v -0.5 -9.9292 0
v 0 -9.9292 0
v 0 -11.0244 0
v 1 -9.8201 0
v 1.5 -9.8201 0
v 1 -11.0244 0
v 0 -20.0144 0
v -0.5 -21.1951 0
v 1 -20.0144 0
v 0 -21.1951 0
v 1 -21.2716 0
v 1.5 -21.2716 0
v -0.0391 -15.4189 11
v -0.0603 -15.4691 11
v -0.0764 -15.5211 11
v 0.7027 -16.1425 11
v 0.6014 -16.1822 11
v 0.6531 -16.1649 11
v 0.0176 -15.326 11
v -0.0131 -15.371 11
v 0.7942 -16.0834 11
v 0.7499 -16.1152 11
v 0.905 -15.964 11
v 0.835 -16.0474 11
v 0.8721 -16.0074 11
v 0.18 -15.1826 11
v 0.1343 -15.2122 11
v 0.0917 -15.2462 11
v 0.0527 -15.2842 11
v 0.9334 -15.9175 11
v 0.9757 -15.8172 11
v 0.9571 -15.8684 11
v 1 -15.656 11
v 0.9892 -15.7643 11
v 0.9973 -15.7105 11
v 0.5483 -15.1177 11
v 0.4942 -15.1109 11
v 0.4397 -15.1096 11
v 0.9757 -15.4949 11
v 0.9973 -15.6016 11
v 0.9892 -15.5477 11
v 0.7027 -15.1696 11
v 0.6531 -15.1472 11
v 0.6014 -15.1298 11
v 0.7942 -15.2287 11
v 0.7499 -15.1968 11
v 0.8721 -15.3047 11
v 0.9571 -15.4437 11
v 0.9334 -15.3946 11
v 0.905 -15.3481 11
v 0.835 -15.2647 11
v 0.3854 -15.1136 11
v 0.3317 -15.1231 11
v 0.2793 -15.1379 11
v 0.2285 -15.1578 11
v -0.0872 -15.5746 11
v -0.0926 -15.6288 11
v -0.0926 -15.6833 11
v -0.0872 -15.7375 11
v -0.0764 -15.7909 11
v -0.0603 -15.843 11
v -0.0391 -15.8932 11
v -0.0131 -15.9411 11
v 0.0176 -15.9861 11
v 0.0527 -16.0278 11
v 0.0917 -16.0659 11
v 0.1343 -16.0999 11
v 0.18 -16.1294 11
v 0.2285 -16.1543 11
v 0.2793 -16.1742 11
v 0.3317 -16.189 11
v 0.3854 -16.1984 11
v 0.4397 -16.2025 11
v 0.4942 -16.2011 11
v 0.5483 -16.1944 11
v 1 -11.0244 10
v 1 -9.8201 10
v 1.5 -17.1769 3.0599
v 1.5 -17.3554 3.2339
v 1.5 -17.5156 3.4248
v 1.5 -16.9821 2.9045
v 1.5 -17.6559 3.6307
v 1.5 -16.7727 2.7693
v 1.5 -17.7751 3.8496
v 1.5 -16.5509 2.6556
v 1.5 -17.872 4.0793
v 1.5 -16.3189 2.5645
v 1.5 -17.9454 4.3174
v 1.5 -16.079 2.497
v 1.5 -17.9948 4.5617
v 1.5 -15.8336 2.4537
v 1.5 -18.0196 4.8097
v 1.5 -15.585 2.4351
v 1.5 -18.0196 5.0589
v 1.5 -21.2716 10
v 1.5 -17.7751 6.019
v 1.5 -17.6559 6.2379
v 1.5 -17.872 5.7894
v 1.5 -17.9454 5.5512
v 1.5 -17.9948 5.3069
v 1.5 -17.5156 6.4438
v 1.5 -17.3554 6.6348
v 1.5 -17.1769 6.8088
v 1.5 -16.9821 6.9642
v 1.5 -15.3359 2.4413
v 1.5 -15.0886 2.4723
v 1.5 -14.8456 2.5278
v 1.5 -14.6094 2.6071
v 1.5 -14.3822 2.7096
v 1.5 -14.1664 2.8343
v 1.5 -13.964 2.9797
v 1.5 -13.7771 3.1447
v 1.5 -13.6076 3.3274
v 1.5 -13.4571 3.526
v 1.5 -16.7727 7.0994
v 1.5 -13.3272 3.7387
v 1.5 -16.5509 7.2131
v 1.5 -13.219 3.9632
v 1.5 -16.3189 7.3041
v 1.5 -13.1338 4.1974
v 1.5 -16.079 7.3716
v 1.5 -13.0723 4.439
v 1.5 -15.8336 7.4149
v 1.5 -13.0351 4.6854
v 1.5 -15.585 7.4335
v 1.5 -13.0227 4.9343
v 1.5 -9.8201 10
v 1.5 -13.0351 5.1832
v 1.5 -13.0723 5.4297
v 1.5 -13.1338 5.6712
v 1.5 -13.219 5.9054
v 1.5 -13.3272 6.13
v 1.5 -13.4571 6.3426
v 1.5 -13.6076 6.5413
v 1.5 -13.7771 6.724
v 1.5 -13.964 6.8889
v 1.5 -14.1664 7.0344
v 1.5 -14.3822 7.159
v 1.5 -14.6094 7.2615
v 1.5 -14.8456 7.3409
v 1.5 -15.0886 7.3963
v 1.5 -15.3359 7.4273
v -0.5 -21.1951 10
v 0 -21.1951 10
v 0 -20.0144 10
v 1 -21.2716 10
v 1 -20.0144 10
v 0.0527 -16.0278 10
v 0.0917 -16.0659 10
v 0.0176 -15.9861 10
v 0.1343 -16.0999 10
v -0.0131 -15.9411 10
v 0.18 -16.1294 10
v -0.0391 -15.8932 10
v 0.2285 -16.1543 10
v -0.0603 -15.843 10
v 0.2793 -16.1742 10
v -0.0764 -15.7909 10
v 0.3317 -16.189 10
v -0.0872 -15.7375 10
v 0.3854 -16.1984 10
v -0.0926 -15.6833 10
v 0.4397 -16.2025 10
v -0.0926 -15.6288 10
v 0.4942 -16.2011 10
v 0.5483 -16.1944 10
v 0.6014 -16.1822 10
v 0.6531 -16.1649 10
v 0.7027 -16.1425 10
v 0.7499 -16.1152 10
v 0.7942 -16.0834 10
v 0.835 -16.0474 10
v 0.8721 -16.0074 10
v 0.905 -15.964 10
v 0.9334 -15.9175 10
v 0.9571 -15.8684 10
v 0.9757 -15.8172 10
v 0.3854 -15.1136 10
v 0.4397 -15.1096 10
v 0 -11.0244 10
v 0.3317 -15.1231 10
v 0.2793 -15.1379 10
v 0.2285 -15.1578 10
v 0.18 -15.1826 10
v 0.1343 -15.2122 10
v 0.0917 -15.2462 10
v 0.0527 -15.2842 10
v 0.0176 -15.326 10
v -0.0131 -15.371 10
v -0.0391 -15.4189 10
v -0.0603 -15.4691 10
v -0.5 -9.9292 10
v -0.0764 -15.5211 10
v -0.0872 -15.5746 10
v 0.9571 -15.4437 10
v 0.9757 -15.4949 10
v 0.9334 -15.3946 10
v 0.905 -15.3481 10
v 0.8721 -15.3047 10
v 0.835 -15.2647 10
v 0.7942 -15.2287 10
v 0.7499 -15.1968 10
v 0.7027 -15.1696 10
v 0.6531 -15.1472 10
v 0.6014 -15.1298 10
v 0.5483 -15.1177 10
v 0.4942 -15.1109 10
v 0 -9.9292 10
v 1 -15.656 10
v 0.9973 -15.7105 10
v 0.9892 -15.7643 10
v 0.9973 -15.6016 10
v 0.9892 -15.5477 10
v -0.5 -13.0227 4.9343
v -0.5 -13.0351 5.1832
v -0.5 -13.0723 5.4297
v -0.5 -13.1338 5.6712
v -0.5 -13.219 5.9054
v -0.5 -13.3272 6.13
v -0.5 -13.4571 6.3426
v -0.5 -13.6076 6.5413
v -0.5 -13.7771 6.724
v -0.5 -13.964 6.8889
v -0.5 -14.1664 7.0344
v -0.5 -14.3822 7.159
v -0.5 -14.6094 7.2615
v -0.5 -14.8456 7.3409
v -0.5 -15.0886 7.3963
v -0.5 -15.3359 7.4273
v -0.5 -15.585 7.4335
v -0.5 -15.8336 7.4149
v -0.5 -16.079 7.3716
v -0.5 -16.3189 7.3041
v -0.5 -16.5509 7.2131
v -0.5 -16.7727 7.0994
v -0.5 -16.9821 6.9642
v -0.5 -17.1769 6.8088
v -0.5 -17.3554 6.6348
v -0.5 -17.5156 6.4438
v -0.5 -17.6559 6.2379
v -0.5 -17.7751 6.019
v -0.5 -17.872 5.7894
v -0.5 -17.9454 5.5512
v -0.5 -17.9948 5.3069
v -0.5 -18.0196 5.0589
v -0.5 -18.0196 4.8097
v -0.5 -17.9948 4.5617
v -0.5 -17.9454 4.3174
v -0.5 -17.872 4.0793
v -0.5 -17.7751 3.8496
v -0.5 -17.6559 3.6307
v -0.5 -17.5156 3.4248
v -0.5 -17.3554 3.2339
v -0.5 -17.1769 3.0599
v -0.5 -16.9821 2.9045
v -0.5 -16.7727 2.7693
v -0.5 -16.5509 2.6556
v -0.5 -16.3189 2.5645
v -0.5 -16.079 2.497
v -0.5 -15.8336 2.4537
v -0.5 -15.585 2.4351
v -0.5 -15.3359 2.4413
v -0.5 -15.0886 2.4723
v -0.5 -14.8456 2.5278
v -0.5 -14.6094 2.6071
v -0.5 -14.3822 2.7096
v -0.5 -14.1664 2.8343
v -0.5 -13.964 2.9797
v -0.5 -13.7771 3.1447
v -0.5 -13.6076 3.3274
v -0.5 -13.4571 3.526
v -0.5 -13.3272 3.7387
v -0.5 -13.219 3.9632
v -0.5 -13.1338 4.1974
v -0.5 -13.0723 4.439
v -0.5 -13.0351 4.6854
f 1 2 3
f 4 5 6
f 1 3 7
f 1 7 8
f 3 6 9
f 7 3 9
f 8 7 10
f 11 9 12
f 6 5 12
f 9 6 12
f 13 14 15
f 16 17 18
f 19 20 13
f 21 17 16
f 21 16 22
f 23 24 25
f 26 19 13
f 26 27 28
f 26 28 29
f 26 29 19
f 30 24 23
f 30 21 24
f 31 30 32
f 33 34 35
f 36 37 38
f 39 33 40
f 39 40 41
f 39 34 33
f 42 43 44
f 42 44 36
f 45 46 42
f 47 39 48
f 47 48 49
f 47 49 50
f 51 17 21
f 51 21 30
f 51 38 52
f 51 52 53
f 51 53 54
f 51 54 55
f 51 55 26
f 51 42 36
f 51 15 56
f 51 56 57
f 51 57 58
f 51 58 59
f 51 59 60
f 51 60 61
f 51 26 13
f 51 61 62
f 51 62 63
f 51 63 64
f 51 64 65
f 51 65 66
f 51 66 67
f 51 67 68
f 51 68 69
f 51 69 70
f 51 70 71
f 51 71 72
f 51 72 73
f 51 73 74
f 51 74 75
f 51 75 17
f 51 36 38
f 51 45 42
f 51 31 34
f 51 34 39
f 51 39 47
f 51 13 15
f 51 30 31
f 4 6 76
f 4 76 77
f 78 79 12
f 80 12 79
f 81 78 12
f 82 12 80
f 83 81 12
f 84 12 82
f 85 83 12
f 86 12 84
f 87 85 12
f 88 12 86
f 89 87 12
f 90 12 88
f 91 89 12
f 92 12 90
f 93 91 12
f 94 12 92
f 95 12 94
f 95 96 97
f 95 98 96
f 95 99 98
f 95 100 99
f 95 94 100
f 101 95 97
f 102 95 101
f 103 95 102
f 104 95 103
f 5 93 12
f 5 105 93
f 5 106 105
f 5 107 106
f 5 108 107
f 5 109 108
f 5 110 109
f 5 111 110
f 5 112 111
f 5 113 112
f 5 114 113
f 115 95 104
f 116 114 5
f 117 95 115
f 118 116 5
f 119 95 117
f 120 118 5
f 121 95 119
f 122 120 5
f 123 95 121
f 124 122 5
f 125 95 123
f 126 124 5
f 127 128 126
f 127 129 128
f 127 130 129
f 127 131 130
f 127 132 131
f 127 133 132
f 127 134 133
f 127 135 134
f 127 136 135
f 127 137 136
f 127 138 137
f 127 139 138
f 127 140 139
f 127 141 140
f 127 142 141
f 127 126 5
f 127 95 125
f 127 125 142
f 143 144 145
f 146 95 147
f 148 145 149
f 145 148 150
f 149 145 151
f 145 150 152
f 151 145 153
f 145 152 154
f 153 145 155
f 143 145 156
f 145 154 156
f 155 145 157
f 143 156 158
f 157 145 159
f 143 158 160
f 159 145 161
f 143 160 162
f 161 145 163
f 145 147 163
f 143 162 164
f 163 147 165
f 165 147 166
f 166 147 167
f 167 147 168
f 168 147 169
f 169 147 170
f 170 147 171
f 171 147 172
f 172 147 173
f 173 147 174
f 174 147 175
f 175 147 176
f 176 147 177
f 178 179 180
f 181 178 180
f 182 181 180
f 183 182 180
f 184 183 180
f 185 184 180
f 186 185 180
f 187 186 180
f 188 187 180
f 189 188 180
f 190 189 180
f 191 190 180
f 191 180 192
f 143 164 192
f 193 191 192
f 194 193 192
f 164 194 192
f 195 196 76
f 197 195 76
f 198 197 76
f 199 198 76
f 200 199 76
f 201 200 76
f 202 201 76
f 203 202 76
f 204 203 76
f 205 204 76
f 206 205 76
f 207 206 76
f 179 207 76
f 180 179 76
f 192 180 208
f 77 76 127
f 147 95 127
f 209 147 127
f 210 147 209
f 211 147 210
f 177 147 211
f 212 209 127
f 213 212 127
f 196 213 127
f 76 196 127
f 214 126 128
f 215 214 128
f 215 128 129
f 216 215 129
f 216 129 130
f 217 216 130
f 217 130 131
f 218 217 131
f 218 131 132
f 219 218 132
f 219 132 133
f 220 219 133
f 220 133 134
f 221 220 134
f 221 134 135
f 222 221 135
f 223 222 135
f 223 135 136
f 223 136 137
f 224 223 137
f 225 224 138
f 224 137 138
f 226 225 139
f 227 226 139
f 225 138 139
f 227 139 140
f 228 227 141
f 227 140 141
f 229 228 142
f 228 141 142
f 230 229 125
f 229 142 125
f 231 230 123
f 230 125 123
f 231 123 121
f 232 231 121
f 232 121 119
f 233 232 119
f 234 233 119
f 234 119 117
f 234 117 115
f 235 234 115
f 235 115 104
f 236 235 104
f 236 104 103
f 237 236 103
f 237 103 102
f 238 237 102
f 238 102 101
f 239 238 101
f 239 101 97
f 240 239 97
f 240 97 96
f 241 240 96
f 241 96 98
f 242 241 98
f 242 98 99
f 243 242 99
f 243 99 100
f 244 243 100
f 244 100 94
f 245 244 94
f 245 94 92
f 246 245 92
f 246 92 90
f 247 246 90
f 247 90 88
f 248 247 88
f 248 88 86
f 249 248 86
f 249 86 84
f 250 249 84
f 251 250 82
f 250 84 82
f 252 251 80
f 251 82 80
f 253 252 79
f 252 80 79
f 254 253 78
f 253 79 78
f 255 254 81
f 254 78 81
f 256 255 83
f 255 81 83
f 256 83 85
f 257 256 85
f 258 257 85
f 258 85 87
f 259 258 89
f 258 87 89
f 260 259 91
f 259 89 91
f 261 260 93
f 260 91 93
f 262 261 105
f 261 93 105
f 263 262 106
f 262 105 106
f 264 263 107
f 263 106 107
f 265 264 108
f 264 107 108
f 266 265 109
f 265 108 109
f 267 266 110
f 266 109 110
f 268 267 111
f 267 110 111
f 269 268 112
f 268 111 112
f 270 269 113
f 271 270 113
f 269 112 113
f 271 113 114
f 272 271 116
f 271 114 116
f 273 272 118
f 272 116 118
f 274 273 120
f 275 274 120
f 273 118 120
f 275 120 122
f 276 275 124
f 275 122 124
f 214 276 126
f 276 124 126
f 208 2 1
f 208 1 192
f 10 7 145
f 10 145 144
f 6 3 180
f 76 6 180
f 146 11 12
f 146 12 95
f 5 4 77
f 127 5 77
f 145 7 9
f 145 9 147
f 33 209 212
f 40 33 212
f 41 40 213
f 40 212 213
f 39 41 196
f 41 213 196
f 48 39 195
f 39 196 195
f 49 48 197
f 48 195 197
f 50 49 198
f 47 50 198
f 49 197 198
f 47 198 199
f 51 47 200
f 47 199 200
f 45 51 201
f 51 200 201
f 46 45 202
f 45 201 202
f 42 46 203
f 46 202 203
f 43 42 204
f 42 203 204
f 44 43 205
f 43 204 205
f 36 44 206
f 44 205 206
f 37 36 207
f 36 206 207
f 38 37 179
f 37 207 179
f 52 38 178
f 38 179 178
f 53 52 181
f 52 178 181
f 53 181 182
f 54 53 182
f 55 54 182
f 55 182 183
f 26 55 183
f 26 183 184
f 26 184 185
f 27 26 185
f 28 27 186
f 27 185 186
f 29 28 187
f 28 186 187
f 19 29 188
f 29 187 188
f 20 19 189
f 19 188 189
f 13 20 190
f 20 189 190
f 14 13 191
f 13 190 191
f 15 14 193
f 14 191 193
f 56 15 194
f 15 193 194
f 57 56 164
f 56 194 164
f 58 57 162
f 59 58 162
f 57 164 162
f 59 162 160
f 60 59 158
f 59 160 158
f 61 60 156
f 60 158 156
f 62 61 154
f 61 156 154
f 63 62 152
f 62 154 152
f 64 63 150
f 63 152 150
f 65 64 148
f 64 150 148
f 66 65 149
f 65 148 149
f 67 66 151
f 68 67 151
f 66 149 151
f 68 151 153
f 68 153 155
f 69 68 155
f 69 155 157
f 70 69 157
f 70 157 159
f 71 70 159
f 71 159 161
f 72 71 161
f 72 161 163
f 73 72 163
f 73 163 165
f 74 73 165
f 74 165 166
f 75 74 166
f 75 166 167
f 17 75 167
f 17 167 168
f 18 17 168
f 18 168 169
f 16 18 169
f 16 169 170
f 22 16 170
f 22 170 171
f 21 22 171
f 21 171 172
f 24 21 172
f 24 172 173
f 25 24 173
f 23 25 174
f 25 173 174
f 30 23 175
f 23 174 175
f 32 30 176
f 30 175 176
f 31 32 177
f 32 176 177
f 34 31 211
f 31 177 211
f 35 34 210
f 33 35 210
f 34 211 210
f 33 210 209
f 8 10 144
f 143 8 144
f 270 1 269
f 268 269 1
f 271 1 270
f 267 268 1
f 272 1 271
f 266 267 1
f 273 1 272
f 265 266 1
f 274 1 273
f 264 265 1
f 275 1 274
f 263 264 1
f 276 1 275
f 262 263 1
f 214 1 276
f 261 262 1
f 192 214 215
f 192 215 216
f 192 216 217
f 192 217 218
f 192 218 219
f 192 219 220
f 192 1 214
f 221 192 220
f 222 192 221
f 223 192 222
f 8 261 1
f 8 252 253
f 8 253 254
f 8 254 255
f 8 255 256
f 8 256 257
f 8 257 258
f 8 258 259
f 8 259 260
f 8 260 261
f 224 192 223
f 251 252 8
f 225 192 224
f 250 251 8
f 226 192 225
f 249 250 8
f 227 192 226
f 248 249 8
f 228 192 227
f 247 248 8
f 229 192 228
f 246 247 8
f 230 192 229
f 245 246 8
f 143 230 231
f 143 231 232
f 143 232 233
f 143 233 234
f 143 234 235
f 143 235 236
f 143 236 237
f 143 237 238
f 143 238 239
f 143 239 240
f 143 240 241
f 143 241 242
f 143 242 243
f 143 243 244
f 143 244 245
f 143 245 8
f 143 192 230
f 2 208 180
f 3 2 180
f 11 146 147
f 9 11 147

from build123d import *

# Parameters (mm, degrees)
F0_W     = 8.99
F0_H     = 10
F1_DEPTH = 1
F2_W     = 1.2572725254
F2_H     = 10
F2_W_2   = 1.20427544
F2_W_3   = 8.99
F3_DEPTH = 0.5
F4_W     = 1.095204528
F4_H     = 10
F4_W_2   = 8.99
F4_W_3   = 1.1806842821
F5_DEPTH = 0.5
F7_D     = 5
F8_R     = 0.546635634
F9_DEPTH = 1


with BuildPart() as f1:
    # F0 (on Right) → F1 (new body)
    with BuildSketch(Plane.YZ):
        with Locations((-15.5193753601, 5)):
            Rectangle(F0_W, F0_H)
    extrude(amount=F1_DEPTH)

    # F2 (on face) → F3 (join)
    with BuildSketch(Plane.YZ.offset(1)):
        with Locations((-20.6430116228, 5)):
            Rectangle(F2_W, F2_H)
        with Locations((-10.4222376401, 5)):
            Rectangle(F2_W_2, F2_H)
        with Locations((-15.5193753601, 5)):
            Rectangle(F2_W_3, F2_H)
    extrude(amount=F3_DEPTH)

    # F4 (on face) → F5 (join)
    with BuildSketch(Plane(origin=(0, 0, 0), x_dir=(0, -1, 0), z_dir=(-1, 0, 0))):
        with Locations((10.4767730961, 5)):
            Rectangle(F4_W, F4_H)
        with Locations((15.5193753601, 5)):
            Rectangle(F4_W_2, F4_H)
        with Locations((20.6047175011, 5)):
            Rectangle(F4_W_3, F4_H)
    extrude(amount=F5_DEPTH)

    # F7 (through all)
    with Locations(Plane(origin=(-0.5, 0, 0), x_dir=(0, -1, 0), z_dir=(-1, 0, 0))):
        with Locations((15.5227221549, 4.934320692)):
            Hole(F7_D / 2)

    # F8 (on face) → F9 (join)
    with BuildSketch(Plane.XY.offset(10)):
        with Locations((0.453364366, -15.6560353935)):
            Circle(F8_R)
    extrude(amount=F9_DEPTH)


solid = f1.part
